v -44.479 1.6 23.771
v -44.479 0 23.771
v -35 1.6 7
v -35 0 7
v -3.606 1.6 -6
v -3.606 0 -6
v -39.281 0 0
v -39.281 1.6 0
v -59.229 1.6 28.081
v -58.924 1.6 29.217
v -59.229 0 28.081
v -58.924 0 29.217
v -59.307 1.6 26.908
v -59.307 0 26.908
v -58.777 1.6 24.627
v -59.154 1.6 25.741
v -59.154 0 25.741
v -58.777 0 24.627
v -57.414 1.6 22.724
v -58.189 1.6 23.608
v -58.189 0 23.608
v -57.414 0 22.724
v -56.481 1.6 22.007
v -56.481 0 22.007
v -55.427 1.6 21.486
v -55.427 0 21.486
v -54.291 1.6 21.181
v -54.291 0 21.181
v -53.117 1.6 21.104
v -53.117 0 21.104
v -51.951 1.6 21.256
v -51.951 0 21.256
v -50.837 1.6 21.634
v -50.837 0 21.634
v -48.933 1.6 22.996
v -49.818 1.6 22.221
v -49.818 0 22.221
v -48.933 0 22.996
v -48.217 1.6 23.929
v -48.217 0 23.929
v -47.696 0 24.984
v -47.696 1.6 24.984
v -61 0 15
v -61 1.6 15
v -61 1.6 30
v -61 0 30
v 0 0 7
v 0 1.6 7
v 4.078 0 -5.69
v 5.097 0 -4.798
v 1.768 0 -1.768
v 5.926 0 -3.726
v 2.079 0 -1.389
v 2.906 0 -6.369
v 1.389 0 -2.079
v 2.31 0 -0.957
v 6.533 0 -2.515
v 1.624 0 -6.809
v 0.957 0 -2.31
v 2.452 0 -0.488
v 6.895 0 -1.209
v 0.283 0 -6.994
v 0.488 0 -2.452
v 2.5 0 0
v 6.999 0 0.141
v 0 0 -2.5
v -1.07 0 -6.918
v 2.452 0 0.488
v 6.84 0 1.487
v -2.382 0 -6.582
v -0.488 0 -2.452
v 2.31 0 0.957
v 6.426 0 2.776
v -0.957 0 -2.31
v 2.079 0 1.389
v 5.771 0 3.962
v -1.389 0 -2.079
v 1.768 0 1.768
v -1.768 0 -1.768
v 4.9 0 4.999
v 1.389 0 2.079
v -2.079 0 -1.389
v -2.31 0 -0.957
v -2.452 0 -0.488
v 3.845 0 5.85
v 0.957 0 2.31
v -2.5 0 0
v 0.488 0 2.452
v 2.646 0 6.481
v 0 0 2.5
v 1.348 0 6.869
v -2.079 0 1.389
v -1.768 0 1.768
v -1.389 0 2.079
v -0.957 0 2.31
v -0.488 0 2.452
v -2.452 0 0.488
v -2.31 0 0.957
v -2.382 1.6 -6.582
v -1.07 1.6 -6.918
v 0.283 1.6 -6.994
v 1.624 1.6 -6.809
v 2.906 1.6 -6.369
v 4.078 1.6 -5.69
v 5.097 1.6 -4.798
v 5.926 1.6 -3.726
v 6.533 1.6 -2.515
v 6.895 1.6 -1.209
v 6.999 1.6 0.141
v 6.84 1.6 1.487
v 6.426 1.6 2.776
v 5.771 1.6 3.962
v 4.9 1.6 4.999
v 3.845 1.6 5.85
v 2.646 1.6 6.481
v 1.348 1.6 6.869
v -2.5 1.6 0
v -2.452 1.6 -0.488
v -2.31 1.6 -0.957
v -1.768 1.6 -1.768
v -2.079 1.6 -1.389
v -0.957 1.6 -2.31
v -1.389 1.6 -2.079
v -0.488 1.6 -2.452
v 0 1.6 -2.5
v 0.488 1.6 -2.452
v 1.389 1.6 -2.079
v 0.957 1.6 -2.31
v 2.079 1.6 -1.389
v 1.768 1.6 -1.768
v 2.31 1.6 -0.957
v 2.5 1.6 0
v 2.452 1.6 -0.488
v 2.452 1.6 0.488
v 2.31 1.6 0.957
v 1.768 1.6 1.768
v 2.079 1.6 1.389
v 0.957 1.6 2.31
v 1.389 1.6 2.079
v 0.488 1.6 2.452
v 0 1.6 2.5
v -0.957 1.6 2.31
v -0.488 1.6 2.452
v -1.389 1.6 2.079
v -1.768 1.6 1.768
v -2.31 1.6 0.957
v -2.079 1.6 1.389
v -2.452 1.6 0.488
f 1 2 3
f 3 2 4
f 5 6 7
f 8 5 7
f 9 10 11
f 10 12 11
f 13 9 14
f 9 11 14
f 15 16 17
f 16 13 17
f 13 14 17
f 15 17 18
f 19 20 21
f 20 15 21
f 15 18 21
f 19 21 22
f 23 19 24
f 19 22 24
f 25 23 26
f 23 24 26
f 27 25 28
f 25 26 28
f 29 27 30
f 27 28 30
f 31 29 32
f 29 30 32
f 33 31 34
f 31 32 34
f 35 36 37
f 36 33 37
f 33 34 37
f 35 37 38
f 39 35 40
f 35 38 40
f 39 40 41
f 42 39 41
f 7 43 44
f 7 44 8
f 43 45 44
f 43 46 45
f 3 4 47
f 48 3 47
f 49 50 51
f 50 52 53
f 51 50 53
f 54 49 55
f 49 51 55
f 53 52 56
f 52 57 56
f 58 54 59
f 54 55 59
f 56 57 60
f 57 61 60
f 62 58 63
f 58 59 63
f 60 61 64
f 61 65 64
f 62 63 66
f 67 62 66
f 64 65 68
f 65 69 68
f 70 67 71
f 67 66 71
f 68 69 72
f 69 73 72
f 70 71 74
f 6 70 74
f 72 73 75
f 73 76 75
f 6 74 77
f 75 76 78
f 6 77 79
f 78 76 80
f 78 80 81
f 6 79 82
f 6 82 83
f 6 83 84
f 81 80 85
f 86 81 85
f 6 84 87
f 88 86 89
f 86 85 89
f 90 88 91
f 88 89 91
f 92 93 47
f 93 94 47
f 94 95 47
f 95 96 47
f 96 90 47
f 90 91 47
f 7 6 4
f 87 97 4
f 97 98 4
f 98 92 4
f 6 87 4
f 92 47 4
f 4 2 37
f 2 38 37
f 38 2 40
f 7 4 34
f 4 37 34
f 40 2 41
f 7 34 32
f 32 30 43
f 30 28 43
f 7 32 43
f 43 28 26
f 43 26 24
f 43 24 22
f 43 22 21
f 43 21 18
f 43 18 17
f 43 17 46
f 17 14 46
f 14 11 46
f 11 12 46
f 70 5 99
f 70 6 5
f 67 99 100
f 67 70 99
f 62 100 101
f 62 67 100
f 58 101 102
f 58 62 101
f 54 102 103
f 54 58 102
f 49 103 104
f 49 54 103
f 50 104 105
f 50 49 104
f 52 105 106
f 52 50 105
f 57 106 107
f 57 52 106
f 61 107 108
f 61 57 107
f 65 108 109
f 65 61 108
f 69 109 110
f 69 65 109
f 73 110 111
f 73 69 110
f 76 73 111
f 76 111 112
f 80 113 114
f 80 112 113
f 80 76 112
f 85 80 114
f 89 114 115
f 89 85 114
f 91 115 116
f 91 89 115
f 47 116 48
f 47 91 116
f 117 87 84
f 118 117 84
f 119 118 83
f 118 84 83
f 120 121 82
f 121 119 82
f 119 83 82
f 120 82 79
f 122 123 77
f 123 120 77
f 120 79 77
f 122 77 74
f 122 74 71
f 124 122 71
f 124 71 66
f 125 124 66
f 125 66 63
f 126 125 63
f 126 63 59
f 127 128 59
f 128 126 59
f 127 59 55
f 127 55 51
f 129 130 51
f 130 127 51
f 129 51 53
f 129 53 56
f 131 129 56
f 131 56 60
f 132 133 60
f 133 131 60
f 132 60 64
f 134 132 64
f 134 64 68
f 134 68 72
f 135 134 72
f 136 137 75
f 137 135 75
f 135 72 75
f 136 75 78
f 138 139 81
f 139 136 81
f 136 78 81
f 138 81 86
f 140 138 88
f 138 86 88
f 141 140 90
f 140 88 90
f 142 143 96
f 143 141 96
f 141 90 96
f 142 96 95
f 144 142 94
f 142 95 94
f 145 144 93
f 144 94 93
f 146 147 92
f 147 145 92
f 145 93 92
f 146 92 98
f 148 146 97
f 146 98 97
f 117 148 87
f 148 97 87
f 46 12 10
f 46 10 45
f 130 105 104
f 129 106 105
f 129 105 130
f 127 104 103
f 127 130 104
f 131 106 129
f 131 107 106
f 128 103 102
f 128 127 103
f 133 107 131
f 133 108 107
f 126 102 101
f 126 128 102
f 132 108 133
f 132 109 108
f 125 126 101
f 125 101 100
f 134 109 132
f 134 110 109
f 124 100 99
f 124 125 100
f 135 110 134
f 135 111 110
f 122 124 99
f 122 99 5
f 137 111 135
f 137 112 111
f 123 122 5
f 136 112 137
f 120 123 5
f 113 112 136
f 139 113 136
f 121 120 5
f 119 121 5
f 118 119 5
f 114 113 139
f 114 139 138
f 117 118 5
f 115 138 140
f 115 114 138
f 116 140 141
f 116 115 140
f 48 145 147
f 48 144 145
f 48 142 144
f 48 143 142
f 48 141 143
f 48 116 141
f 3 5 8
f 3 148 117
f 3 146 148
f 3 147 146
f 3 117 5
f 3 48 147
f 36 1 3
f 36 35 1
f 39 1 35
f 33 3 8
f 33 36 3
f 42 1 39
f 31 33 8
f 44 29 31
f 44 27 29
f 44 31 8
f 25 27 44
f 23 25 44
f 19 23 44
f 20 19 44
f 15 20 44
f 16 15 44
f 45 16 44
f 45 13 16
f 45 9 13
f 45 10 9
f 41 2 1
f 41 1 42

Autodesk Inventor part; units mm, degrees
ref_plane "YZ Plane" through (0, 0, 0) normal (1, 0, 0) x (0, 1, 0)
ref_plane "XZ Plane" through (0, 0, 0) normal (0, 1, 0) x (-1, 0, 0)
ref_plane "XY Plane" through (0, 0, 0) normal (0, 0, 1) x (1, 0, 0)
sketch "Szkic1" plane through (0, 0, 0) normal (0, 1, 0) x (-1, 0, 0)
  arc A0 (0, 7) -> (3.6056, -6) centre (0, 0) ccw
  line L0 (3.6056, -6) -> (39.2808, 0)
  line L1 (44.4792, 23.7708) -> (35, 7)
  line L2 (35, 7) -> (0, 7)
  circle A1 centre (0, 0) radius 2.5
  line L3 (61, 30) -> (61, 15)
  line L4 (61, 15) -> (39.2808, 0)
  arc A2 (47.6958, 24.9837) -> (58.9242, 29.2173) centre (53.31, 27.1005) ccw
  line L5 (44.4792, 23.7708) -> (47.6958, 24.9837)
  line L6 (58.9242, 29.2173) -> (61, 30)
  dimension "d0" = 14
  dimension "d1" = 5
  dimension "d5" = 12
extrude "Wyciągnięcie proste1" add sketch "Szkic1" along normal blind 1.6
properties part number "efektor szczypce1"
